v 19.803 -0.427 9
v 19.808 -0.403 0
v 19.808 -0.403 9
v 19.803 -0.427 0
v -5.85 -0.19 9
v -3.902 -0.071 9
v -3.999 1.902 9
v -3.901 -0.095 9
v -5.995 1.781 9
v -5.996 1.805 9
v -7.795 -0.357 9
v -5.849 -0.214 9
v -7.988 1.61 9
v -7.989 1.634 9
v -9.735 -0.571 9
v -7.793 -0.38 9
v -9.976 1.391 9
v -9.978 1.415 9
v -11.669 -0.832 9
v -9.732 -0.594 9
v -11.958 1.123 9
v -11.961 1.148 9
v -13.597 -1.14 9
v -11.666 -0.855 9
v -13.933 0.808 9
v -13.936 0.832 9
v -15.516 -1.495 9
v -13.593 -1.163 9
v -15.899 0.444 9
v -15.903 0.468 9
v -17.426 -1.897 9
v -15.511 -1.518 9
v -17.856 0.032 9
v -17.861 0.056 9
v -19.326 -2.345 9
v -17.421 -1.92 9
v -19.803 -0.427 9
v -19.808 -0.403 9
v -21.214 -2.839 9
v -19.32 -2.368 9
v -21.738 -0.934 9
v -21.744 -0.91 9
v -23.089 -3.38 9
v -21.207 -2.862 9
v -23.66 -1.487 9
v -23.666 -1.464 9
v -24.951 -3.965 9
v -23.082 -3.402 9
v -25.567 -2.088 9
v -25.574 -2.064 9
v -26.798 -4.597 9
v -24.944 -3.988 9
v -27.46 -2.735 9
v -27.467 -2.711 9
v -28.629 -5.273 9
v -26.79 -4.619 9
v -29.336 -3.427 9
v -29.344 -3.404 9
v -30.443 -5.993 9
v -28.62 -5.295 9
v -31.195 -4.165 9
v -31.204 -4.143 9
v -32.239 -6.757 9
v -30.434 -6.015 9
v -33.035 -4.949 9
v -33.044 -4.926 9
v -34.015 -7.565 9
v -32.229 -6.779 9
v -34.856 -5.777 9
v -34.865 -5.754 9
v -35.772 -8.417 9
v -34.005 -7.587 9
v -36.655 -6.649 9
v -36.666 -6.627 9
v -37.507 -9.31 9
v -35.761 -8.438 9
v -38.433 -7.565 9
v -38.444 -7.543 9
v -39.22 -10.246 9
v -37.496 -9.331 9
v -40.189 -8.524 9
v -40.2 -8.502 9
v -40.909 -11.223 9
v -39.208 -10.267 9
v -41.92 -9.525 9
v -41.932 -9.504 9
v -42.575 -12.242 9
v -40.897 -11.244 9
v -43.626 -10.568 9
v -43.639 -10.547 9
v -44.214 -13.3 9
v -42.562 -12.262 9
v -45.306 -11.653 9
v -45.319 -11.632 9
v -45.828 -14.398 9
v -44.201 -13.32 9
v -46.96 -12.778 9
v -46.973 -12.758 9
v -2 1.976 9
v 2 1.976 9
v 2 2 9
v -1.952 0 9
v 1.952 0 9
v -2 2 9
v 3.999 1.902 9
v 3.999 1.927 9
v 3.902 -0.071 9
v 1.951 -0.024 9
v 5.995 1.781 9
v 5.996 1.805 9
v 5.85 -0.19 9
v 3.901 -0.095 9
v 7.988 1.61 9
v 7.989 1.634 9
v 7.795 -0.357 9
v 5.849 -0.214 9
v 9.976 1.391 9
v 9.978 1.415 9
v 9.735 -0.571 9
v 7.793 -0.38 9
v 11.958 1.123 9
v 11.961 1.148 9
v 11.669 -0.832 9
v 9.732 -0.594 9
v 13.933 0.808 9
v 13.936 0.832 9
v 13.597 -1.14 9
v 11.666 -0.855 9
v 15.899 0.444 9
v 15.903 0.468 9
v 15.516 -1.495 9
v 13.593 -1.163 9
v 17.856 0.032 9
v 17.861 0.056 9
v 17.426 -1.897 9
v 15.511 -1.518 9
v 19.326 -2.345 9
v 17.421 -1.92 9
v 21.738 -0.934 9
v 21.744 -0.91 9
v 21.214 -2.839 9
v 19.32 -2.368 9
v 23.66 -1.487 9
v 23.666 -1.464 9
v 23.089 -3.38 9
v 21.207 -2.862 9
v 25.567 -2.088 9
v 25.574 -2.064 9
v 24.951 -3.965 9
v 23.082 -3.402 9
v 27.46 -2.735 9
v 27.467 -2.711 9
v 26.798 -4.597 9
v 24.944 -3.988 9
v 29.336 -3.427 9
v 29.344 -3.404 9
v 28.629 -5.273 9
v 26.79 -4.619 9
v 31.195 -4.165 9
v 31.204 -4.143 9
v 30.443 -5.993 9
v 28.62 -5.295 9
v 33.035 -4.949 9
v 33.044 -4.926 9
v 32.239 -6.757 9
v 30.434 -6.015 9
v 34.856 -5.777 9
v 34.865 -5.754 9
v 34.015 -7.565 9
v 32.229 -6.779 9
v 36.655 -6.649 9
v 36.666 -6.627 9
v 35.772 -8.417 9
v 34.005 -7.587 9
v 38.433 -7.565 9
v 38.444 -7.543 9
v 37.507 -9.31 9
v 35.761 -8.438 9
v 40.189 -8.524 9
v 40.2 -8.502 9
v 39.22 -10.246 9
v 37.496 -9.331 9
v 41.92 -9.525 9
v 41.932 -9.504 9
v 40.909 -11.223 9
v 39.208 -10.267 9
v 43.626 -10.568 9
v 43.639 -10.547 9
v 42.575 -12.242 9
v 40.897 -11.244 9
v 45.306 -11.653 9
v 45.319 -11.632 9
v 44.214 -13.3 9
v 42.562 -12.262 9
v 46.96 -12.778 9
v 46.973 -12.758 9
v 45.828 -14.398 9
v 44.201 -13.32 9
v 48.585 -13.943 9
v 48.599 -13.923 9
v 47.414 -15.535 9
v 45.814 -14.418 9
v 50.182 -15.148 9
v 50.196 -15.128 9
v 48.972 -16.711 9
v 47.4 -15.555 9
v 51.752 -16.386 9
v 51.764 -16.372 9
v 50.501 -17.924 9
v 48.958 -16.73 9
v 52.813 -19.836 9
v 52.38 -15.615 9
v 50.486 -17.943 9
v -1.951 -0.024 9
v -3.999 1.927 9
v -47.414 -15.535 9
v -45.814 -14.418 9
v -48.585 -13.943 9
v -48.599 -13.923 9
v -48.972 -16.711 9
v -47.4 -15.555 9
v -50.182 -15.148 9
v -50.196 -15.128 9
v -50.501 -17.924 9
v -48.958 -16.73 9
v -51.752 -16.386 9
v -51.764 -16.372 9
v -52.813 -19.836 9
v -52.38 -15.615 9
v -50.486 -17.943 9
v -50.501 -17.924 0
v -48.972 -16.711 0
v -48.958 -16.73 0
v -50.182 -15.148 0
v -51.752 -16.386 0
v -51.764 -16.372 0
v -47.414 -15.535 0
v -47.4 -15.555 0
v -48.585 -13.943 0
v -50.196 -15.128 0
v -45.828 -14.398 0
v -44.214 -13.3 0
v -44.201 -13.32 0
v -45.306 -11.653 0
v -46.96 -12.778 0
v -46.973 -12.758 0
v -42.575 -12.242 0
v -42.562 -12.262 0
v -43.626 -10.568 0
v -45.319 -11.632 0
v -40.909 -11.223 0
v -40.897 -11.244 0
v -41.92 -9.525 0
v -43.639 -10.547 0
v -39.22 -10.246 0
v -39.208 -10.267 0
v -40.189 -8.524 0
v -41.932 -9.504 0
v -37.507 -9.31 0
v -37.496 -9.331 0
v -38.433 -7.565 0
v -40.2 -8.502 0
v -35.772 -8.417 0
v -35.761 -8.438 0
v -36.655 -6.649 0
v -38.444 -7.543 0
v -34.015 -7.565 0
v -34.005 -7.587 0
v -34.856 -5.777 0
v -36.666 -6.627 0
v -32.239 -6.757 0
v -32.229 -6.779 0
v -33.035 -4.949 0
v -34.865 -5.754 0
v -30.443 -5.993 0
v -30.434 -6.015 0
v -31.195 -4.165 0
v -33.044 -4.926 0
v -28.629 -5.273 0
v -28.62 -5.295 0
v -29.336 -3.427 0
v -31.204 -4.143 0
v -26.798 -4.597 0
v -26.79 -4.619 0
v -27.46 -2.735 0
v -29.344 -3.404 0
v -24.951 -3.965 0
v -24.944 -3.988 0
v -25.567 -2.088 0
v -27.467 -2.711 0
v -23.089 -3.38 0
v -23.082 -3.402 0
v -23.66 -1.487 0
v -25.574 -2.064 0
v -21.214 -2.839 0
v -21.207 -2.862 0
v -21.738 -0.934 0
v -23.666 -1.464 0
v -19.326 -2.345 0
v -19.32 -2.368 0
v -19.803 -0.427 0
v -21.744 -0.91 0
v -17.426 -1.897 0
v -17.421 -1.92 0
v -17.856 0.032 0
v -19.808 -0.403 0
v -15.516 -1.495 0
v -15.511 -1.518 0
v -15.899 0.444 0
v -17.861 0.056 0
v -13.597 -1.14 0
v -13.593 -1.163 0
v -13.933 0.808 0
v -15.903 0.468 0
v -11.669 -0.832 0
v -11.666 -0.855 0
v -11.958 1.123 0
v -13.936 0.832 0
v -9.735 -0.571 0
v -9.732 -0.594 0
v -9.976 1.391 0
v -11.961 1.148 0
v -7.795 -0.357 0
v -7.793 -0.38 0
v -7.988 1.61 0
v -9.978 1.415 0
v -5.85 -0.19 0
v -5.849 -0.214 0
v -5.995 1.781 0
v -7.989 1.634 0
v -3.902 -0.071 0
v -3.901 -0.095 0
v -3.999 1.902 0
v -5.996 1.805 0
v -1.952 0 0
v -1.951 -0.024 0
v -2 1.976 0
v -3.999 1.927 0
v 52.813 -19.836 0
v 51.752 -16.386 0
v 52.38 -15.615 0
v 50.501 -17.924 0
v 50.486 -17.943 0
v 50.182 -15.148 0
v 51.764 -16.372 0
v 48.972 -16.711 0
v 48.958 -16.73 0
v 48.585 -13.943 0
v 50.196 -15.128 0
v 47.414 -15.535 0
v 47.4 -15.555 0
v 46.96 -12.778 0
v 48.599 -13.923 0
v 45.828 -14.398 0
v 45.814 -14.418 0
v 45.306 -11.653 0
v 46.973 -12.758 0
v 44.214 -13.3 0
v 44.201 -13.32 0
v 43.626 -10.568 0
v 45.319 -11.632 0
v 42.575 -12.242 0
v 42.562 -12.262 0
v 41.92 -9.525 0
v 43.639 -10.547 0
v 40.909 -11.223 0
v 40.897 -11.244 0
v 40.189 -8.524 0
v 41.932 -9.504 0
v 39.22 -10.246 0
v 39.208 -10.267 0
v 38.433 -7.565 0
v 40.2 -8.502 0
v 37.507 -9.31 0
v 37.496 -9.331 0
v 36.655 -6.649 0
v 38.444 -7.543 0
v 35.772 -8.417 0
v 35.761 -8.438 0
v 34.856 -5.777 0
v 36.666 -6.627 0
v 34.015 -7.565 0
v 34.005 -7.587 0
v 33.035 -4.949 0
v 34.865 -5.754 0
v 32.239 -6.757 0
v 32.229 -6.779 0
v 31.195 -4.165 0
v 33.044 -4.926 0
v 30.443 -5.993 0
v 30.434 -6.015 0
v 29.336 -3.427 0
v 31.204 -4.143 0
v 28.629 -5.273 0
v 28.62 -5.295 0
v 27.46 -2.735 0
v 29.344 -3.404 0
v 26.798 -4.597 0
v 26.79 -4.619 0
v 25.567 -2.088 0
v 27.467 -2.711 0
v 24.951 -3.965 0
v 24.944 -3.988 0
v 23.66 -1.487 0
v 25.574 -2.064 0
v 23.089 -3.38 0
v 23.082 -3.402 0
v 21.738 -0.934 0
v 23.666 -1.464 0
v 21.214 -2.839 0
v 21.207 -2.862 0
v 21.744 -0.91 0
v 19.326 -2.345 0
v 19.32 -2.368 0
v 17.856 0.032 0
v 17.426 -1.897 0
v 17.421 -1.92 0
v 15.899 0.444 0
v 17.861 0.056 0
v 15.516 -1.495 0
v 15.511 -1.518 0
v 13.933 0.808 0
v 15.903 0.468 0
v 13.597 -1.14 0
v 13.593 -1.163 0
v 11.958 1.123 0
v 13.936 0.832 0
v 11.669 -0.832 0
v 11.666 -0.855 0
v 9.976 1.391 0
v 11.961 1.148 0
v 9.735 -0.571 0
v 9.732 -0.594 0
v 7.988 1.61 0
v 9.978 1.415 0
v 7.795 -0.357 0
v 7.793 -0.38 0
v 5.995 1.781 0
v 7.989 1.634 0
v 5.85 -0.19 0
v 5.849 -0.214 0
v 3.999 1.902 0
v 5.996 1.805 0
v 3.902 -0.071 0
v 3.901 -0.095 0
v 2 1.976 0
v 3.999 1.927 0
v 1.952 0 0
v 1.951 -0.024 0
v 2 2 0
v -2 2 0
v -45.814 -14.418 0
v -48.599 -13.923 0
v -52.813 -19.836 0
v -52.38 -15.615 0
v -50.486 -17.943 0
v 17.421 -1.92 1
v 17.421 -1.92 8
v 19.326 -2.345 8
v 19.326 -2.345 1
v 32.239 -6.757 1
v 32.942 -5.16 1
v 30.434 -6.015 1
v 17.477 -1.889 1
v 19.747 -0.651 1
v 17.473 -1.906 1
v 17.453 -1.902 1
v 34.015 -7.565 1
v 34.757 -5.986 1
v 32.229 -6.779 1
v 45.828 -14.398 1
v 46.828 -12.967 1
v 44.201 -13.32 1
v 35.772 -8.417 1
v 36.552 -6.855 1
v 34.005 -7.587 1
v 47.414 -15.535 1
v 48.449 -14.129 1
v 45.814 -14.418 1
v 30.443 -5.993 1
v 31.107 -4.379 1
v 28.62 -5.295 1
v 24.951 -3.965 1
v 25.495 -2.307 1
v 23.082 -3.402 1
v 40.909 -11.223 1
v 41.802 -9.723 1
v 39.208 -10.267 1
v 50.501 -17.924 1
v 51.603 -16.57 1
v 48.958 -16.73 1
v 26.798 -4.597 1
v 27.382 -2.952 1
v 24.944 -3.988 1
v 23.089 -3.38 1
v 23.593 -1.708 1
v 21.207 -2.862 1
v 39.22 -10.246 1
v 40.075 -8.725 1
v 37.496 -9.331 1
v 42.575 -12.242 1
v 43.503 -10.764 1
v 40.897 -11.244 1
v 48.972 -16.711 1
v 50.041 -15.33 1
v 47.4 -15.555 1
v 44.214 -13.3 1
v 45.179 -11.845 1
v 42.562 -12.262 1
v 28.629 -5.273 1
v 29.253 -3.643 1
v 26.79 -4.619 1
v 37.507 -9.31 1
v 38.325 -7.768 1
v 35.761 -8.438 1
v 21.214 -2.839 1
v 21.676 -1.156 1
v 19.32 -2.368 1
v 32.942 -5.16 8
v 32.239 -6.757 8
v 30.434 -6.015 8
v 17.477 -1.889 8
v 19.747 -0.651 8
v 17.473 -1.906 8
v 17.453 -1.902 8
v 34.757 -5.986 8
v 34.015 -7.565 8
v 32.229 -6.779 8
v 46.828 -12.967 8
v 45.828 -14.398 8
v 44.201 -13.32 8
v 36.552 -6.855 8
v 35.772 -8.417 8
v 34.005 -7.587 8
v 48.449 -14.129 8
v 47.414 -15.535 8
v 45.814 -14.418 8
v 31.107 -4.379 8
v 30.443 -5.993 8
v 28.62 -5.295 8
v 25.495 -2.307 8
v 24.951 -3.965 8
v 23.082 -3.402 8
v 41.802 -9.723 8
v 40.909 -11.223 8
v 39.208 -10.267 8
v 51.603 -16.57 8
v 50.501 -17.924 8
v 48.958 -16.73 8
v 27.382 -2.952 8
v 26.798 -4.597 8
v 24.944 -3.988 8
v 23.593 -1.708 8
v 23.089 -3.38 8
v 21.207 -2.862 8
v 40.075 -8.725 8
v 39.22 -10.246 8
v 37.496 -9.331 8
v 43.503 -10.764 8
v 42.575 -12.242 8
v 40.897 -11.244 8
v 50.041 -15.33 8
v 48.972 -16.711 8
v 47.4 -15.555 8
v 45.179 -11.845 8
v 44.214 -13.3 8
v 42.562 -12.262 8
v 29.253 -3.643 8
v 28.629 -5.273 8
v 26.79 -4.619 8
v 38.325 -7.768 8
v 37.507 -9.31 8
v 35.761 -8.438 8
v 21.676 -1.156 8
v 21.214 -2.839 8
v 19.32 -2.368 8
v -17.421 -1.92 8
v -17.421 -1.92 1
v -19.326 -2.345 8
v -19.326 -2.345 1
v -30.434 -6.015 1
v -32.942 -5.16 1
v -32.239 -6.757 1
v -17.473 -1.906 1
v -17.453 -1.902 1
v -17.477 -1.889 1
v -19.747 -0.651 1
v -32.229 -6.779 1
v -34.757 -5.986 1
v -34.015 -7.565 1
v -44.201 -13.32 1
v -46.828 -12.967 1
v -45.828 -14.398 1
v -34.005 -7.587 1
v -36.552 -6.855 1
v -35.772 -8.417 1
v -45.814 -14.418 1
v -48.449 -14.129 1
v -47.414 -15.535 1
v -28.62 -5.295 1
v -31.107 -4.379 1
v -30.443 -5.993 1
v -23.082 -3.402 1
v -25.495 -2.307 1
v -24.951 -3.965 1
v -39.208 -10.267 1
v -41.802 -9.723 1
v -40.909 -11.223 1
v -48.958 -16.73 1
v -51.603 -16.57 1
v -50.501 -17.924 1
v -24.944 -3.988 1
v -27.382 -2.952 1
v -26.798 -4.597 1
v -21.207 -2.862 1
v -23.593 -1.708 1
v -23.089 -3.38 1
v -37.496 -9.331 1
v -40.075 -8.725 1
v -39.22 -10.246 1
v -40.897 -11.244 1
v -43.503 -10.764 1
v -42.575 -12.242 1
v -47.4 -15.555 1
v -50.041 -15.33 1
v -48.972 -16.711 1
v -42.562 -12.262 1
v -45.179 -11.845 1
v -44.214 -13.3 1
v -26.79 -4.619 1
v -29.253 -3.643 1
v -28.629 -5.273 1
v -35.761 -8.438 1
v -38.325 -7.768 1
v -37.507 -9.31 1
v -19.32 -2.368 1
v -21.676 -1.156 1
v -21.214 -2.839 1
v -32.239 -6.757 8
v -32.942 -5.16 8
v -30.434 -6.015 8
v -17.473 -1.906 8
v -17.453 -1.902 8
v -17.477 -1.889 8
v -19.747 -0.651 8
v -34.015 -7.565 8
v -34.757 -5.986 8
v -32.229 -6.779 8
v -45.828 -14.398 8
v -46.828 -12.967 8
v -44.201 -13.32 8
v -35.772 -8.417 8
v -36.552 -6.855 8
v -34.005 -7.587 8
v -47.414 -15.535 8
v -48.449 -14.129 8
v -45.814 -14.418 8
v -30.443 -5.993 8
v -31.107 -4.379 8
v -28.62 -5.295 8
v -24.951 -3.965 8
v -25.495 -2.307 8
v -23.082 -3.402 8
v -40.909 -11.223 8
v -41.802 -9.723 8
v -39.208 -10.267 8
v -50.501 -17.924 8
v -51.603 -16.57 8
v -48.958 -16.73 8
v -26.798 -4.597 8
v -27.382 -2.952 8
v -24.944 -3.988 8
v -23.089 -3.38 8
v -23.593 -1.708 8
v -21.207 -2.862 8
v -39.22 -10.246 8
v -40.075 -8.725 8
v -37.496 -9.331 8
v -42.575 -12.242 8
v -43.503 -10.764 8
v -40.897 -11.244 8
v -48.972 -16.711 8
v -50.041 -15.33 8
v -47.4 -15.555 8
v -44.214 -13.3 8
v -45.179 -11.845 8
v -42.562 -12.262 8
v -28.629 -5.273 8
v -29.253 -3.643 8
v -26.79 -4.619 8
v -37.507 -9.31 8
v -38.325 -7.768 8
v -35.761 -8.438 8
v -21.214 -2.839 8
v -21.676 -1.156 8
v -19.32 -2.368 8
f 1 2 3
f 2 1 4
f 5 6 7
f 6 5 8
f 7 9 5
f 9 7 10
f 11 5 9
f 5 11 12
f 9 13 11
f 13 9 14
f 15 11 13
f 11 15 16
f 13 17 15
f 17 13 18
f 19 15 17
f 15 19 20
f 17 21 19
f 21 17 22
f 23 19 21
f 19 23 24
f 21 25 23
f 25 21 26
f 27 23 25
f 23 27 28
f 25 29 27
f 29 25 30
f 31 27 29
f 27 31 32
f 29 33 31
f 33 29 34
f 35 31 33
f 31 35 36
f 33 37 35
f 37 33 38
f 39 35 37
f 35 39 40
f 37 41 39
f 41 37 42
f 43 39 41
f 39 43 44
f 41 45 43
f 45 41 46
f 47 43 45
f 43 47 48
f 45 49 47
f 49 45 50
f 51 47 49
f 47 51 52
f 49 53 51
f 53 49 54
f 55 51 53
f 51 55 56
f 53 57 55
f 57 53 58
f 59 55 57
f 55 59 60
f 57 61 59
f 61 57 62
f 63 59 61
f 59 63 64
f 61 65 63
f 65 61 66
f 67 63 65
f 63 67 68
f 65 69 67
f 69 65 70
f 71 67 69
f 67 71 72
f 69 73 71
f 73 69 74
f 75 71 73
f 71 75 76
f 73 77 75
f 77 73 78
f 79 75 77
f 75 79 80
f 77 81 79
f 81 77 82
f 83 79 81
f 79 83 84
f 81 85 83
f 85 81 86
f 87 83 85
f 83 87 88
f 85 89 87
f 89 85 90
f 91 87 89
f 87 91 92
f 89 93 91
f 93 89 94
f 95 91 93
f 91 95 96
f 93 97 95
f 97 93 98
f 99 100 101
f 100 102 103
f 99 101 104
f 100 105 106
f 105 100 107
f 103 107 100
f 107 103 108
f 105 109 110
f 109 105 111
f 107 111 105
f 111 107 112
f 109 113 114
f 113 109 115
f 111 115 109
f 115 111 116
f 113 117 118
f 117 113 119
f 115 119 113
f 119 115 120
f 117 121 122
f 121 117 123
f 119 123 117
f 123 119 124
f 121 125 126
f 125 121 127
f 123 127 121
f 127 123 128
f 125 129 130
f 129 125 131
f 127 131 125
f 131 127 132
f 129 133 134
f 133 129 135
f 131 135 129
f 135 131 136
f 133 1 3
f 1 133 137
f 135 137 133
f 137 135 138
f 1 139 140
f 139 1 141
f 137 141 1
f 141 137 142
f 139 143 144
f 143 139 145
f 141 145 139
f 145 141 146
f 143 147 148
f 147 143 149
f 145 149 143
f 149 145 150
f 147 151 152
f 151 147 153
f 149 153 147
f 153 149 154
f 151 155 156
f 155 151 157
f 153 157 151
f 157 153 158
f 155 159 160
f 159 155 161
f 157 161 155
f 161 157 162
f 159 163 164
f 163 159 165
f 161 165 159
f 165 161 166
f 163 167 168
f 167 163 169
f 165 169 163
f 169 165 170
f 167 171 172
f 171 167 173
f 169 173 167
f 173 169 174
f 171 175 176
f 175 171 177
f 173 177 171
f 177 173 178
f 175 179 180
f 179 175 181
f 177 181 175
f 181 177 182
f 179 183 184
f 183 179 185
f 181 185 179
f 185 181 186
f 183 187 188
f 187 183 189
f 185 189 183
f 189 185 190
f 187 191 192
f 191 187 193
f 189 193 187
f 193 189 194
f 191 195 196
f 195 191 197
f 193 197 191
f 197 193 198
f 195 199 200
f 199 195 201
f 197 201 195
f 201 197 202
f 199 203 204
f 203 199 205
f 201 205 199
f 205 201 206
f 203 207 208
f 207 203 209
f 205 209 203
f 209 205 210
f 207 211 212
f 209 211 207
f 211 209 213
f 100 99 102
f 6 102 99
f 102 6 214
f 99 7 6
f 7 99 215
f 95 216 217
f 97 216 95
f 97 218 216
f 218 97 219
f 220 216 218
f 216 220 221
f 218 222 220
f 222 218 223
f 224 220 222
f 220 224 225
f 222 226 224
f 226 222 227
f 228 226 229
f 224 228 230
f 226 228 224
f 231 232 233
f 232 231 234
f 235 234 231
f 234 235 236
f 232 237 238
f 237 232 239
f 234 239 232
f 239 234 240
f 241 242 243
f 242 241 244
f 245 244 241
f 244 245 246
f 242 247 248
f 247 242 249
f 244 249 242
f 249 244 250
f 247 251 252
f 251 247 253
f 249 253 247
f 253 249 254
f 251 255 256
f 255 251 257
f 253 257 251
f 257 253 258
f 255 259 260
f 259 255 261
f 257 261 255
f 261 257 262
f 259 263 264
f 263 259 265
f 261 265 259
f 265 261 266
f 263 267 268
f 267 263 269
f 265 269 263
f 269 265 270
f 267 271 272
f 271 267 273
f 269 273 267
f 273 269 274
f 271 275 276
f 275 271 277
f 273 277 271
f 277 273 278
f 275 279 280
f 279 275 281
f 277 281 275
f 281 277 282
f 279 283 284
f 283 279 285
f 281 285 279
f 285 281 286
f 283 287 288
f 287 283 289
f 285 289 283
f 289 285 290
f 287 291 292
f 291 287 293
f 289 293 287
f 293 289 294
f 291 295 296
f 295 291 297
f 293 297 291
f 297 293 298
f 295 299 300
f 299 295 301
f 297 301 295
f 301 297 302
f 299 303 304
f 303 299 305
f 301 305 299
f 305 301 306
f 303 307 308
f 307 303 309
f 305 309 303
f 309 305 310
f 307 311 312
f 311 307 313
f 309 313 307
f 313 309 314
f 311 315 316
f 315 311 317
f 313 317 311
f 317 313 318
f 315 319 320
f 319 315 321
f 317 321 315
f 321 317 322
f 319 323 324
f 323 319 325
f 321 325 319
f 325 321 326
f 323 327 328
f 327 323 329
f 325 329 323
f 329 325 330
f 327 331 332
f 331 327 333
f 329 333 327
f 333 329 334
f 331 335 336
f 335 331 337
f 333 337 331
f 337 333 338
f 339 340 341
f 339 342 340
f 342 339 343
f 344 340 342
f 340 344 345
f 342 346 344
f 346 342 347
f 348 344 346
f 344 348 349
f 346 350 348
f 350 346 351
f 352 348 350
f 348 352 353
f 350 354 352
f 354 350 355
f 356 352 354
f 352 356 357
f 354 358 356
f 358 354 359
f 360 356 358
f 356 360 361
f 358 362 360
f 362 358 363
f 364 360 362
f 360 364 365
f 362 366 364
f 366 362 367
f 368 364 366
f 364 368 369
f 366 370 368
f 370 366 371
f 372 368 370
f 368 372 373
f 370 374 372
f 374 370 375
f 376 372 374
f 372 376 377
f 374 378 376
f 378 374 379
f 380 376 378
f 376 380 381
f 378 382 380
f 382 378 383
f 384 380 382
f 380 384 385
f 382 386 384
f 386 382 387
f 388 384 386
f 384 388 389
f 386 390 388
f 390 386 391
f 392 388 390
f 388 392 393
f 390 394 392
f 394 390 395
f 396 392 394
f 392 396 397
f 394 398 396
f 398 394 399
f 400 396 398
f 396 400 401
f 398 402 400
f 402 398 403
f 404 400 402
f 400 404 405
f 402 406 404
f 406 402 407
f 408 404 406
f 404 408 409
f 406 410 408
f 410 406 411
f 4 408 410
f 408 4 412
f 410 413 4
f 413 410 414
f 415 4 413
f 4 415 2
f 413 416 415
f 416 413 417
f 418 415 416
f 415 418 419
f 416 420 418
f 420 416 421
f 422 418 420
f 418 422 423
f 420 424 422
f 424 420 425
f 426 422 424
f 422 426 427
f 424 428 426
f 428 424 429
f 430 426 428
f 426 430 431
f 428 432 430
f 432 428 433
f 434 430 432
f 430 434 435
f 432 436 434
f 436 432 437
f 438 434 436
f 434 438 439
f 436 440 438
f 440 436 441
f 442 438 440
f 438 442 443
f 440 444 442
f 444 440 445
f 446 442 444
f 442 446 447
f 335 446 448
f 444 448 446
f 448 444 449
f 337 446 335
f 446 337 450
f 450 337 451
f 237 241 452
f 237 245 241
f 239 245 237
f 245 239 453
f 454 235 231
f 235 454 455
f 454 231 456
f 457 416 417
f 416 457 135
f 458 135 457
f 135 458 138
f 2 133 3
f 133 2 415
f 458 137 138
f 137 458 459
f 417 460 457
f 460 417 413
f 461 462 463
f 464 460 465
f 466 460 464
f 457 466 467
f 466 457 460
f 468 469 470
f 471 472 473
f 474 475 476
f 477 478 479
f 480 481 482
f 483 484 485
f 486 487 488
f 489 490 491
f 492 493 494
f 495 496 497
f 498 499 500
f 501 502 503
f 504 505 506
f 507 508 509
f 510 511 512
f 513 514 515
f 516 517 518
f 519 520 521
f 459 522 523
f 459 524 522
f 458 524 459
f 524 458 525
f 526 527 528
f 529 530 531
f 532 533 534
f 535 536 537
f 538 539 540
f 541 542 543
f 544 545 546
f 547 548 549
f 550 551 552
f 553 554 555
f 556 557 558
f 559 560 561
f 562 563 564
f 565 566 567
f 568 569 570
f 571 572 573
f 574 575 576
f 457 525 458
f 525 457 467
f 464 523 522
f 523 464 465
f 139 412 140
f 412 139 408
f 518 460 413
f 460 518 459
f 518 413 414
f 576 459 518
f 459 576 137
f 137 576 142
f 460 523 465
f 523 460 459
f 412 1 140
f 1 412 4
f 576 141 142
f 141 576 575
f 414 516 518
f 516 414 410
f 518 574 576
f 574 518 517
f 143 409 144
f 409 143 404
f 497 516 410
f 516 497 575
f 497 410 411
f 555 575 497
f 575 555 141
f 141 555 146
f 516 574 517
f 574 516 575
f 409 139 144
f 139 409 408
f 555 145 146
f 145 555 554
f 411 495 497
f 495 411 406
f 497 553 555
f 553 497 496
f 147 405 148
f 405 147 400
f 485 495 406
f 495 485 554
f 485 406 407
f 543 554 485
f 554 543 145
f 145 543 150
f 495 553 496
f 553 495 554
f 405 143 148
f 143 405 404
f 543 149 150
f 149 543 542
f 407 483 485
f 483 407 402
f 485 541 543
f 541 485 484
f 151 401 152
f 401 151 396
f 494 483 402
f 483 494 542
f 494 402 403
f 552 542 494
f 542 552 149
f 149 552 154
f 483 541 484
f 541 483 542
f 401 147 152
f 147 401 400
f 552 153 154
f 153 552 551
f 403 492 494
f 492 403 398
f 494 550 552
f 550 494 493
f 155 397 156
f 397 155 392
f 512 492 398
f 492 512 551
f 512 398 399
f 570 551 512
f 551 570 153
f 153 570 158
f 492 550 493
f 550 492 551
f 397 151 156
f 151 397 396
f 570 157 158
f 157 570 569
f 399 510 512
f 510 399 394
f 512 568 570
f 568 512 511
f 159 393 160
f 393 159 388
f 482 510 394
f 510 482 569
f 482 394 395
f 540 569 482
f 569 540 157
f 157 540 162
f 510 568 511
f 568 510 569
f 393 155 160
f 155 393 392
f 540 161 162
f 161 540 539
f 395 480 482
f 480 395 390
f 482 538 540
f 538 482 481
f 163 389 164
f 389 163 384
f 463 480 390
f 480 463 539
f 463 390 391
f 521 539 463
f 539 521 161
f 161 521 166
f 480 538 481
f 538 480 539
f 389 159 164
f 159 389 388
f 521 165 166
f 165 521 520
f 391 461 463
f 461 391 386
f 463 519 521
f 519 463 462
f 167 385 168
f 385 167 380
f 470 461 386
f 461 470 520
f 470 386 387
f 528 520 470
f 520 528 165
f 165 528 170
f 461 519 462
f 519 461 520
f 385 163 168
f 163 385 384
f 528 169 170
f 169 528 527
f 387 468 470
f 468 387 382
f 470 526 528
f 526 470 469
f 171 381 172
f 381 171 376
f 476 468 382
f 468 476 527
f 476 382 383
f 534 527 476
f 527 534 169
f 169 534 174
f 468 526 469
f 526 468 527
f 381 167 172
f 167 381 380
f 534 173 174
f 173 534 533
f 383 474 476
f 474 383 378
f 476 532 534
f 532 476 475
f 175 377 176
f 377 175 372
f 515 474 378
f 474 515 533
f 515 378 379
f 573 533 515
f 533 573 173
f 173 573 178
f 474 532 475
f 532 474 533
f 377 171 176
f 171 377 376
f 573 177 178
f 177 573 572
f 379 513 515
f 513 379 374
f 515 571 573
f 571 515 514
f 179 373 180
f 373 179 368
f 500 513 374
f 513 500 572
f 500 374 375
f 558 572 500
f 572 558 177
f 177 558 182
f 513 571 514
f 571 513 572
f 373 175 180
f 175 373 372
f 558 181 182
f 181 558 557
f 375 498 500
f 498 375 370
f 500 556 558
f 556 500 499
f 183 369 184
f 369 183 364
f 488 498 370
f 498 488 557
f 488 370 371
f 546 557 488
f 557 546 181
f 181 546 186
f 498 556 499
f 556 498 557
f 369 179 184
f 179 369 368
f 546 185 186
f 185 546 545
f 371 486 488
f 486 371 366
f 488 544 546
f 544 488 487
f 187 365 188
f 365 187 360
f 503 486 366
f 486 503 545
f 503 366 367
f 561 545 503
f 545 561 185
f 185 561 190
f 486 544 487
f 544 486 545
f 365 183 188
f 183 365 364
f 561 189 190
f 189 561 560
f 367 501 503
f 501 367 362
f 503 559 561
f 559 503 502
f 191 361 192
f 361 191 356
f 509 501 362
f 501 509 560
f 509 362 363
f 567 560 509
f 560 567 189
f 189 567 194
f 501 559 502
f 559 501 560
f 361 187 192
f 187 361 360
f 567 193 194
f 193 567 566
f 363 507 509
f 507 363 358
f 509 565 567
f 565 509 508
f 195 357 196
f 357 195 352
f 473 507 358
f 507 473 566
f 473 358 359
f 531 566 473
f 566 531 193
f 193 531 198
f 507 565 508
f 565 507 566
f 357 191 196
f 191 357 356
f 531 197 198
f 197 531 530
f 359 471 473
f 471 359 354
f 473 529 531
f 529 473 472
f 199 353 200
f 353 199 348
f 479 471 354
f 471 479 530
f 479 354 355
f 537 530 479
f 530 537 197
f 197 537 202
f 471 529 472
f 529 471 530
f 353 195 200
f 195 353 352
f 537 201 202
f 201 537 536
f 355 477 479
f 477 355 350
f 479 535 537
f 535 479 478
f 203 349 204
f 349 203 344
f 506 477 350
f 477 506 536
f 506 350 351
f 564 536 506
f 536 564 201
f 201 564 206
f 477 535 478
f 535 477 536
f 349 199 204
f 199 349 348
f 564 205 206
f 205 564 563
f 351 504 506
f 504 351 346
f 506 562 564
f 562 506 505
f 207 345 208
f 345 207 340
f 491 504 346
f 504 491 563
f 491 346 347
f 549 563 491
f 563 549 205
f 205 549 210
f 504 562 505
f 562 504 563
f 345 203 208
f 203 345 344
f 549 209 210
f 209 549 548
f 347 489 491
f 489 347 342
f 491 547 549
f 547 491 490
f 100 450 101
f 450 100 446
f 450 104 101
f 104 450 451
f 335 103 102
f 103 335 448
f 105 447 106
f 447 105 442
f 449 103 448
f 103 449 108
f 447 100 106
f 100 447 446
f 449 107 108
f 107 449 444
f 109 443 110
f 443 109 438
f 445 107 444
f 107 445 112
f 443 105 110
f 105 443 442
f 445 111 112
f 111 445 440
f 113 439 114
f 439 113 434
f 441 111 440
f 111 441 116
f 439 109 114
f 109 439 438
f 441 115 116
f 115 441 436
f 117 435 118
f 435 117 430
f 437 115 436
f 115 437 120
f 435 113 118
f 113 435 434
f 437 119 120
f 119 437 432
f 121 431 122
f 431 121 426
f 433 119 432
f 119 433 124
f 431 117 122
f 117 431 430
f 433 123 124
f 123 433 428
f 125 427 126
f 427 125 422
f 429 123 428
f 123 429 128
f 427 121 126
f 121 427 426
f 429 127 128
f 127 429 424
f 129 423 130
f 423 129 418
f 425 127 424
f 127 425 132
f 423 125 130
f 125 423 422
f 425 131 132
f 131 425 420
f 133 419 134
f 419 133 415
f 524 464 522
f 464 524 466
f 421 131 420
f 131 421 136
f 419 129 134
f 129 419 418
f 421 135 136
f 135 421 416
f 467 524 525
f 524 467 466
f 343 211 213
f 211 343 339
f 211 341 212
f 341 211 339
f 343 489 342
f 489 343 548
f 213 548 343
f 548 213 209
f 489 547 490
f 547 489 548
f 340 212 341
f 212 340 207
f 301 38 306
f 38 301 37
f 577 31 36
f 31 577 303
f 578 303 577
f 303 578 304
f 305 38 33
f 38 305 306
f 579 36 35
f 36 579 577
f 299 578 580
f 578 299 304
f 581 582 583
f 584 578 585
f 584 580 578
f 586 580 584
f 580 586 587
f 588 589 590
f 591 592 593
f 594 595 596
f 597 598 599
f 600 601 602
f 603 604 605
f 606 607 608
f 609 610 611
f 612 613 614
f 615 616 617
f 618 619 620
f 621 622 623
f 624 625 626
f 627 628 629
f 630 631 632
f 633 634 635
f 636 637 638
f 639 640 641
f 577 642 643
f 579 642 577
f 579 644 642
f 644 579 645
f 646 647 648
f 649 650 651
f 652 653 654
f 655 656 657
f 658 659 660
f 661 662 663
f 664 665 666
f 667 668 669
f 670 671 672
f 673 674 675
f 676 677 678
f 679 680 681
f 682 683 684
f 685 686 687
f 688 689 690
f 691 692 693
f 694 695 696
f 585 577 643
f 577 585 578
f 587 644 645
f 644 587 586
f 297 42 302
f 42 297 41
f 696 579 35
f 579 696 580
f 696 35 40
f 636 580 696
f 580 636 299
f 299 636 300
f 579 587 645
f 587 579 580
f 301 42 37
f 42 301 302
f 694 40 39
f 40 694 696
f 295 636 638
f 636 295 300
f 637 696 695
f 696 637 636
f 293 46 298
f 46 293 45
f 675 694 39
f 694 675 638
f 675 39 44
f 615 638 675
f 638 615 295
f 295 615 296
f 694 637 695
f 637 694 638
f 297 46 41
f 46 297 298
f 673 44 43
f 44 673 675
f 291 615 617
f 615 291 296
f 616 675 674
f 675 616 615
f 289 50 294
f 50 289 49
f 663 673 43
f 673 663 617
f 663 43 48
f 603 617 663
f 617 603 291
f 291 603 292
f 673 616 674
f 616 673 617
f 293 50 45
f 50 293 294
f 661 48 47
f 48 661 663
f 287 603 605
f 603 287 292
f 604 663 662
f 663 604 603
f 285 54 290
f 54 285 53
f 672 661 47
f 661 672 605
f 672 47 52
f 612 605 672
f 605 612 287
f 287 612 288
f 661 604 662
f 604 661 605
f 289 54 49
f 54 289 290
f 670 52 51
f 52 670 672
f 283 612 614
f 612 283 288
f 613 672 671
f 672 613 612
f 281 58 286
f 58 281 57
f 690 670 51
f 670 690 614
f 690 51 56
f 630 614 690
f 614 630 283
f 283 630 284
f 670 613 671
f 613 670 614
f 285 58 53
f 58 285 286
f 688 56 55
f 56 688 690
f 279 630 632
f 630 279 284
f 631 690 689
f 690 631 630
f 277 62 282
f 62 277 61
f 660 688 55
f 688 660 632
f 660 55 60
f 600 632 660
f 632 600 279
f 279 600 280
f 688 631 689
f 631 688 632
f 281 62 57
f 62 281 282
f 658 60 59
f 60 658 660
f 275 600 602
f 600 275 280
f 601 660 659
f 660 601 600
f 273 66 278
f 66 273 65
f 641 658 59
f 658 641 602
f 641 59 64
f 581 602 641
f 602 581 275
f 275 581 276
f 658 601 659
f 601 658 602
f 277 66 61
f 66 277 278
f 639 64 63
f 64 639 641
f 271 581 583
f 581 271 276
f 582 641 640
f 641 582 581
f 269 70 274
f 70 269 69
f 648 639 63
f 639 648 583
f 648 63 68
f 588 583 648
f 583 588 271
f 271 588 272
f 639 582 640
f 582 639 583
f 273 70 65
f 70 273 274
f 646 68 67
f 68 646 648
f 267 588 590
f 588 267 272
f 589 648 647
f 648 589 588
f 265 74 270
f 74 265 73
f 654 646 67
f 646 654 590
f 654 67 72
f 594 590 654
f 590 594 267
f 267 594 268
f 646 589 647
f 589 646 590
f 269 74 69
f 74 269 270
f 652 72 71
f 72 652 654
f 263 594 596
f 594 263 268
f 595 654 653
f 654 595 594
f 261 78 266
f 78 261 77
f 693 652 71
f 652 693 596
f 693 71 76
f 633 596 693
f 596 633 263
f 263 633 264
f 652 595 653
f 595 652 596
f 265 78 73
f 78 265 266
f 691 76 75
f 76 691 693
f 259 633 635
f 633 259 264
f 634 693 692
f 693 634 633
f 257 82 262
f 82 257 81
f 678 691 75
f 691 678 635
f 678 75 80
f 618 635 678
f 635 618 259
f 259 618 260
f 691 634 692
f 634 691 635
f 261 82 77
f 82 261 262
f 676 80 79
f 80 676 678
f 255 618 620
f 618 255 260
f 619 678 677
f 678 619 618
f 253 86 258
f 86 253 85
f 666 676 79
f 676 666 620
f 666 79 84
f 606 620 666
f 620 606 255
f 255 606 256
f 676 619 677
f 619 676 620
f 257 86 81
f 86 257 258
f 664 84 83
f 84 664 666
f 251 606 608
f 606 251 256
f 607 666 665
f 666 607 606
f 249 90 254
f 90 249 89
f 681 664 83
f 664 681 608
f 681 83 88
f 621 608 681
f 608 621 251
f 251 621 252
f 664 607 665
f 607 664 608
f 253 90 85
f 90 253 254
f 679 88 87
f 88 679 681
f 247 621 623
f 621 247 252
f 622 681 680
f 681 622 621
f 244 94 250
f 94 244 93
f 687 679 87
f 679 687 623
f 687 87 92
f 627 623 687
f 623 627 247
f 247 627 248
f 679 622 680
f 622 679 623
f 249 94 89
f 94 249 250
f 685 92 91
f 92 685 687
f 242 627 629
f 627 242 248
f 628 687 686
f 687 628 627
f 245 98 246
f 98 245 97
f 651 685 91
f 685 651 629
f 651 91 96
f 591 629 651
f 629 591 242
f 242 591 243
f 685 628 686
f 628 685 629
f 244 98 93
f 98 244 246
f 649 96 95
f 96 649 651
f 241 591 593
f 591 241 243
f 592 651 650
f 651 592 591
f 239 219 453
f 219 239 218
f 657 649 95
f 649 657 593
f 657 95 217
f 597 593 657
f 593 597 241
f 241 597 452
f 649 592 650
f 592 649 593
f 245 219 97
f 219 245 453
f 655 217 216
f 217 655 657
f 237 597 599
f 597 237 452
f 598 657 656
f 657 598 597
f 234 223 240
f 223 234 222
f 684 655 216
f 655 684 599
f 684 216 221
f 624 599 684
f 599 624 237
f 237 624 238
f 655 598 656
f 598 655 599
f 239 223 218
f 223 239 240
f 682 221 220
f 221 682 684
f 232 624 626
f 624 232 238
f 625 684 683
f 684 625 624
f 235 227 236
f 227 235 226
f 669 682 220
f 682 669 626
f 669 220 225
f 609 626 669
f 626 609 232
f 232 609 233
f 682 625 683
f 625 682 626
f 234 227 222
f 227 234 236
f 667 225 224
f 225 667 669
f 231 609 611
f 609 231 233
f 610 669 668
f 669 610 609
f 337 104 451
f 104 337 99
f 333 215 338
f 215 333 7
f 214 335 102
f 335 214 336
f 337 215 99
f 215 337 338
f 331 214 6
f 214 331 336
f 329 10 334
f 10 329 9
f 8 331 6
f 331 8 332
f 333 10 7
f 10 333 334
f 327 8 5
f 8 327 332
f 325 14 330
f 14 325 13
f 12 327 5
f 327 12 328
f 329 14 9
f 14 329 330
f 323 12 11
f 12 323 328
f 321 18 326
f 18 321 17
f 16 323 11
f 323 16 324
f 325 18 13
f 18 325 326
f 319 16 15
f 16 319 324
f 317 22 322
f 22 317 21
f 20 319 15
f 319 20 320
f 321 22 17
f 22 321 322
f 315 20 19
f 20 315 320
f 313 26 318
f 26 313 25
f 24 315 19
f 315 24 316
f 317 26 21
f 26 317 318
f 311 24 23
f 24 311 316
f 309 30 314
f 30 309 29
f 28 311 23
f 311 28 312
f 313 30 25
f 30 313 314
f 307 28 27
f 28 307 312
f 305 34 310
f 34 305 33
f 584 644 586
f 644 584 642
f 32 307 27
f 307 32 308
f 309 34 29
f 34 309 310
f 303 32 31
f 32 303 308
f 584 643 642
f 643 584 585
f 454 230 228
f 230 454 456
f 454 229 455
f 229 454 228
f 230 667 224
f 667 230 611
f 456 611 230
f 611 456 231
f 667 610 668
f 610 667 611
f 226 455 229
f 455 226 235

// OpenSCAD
/*intersection() {
	linear_extrude(height=9) {
		polygon(points = [[0,78], [78,0], [200,200]]);
	}
	
	difference() {
		cylinder(r=80,h=9,$fn=200);
		cylinder(r=78,h=9,$fn=200);
	}
}*/

radius = 80;
height = 9;
toothWidth = 2;
toothDepth = 1.75;
toothSectionDepth = 2;
rimHeight = 1;

module tooth() {
	difference() {
		cube([toothWidth,toothSectionDepth,height]);
		translate([0,0,rimHeight]) {
			linear_extrude(height-(2 * rimHeight)) {
				polygon(points = [[0,0], [toothWidth,toothDepth], [toothWidth,0]]);
			}
		}
	}
}

module side() {
	for(i = [0:27]) {
		rotate(i * (2 * asin((toothWidth / 2) / (radius + toothSectionDepth))),[0,0,-1]) {
			translate([0,radius,0]) {
				if(i < 9) {
					cube([toothWidth,toothSectionDepth,height]);
				} else {
					tooth();
				}
			}
		}
	}
	
	//end piece
	rotate(28 * (2 * asin((toothWidth / 2) / (radius + toothSectionDepth))),[0,0,-1]) {
		translate([0,radius,0]) {
			linear_extrude(height) {
				polygon(points = [[0,0], [0,1 + toothSectionDepth], [1 + toothSectionDepth,0]]);
			}
		}
	}
}

translate([0,-radius,0])
union() {
	side();
	
	mirror([1,0,0]) side();
}
